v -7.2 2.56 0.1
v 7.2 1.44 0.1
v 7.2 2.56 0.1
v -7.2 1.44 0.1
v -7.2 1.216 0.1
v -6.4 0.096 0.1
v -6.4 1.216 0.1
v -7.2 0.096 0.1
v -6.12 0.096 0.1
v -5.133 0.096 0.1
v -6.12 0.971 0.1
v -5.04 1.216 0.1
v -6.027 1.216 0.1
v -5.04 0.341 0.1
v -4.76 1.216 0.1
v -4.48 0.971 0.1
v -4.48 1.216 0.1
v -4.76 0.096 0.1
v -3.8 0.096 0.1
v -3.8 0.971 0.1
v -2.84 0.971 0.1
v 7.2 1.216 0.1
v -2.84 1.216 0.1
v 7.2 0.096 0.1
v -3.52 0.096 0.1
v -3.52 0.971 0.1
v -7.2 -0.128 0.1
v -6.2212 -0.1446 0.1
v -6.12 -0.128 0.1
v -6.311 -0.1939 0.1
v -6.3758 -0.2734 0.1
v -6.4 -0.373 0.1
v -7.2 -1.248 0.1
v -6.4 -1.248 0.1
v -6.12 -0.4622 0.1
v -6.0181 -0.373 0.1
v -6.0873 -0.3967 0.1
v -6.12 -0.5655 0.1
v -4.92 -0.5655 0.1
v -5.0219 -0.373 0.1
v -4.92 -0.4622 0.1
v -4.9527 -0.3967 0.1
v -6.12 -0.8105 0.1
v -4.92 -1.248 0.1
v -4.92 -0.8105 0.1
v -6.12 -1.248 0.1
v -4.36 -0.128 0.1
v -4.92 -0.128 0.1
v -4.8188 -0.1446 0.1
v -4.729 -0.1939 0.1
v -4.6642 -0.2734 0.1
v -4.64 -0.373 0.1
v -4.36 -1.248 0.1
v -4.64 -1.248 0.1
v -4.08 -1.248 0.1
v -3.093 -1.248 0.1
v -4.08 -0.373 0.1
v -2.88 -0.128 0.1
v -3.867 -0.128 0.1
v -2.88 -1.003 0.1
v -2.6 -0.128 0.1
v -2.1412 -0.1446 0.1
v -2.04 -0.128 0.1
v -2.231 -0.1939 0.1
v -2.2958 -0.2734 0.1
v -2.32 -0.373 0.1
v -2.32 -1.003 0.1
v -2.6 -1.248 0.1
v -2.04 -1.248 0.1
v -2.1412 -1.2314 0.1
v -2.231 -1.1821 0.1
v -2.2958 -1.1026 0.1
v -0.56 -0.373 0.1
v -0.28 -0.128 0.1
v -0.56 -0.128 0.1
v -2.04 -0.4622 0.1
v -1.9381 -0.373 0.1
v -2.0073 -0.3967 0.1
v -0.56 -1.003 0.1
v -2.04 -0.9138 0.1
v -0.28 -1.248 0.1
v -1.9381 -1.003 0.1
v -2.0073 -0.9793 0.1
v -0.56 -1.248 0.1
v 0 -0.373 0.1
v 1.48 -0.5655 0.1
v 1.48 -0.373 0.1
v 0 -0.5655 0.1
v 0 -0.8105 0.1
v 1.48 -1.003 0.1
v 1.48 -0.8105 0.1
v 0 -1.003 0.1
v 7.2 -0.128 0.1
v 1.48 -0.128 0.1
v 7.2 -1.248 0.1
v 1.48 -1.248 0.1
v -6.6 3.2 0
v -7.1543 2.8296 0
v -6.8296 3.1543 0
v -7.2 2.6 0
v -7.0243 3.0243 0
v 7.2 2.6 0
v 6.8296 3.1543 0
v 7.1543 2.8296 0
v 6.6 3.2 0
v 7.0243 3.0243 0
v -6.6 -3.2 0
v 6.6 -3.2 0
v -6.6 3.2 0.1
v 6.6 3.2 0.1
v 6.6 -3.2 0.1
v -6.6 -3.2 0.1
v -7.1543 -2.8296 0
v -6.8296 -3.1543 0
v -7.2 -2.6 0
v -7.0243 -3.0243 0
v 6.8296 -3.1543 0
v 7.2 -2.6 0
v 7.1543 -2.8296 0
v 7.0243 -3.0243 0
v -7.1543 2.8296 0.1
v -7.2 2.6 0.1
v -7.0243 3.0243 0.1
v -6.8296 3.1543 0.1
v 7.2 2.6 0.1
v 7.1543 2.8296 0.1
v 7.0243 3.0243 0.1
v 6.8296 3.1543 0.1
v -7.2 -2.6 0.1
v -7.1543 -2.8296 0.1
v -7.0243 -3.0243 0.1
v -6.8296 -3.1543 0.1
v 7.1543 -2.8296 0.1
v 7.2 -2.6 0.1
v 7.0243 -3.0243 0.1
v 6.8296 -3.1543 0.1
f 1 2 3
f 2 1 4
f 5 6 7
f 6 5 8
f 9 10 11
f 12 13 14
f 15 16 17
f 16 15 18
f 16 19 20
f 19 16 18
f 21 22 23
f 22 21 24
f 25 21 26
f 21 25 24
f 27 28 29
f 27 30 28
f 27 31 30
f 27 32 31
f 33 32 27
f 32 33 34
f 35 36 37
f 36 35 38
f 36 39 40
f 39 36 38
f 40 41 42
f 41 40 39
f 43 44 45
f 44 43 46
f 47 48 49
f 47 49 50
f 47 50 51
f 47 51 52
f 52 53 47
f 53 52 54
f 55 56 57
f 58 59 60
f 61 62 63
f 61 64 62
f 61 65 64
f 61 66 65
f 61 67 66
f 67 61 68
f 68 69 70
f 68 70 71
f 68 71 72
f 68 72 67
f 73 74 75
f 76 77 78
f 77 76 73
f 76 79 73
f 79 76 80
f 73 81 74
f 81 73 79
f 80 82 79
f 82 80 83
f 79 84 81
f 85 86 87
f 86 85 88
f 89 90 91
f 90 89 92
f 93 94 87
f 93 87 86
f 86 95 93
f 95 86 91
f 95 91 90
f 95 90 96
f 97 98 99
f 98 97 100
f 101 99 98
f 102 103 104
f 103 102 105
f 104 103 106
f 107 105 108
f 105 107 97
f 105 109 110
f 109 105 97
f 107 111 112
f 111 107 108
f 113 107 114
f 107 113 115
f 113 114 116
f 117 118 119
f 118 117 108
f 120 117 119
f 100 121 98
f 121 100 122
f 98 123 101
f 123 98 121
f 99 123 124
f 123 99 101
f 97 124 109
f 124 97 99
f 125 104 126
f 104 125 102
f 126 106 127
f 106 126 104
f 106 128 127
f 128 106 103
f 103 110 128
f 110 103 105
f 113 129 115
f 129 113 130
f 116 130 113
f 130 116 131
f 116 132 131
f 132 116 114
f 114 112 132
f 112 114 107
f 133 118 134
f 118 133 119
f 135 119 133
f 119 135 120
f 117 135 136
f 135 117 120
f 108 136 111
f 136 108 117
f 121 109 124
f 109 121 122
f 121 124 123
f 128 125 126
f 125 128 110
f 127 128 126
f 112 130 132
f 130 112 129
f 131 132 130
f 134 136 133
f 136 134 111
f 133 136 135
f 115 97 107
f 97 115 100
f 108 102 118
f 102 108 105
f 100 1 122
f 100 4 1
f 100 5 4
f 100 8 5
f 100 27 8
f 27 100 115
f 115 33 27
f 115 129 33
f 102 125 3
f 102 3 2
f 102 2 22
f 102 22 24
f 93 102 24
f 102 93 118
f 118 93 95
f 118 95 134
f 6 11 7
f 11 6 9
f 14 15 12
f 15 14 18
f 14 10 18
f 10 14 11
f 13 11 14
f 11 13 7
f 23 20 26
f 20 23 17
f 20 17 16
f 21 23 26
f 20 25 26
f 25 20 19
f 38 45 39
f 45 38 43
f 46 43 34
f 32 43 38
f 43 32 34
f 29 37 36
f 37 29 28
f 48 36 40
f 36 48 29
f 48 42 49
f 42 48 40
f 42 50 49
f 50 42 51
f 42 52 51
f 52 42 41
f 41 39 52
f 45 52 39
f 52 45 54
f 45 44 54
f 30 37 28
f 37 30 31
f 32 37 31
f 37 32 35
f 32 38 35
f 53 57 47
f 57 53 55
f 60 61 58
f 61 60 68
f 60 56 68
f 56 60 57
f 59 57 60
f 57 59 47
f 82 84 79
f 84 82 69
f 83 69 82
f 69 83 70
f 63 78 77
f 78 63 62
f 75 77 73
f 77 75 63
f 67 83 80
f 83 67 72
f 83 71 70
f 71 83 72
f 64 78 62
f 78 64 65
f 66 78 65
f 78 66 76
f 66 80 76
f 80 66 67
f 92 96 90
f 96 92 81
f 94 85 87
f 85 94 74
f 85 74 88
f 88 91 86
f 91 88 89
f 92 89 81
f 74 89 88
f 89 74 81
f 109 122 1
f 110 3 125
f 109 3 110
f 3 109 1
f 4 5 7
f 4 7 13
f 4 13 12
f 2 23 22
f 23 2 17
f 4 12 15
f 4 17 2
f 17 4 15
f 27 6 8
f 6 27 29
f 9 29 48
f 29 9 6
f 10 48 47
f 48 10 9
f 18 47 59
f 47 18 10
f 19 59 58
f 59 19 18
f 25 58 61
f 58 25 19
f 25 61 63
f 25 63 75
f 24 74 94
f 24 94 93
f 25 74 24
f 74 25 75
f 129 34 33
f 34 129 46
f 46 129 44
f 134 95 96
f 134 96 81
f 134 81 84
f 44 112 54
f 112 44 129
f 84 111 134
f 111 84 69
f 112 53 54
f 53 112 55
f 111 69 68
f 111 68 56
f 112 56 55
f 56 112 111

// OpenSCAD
// file: s/6148328bds02.scad
use <../../lib.scad>
function ldraw_lib__s__6148328bds02() = [
// 0 ~Sticker  0.8 x  1.8 with Black "NT ANCE" on Black Halftone Stripes on White Background - Third Stripe Background
// 0 Name: s\6148328bds02.dat
// 0 Author: Massimo Maso [Sirio]
// 0 !LDRAW_ORG Subpart UPDATE 2024-08
// 0 !LICENSE Licensed under CC BY 4.0 : see CAreadme.txt
// 
// 0 BFC CERTIFY CCW
  [0,"BFC","CERTIFY"],
  [0,"BFC","CCW"],
// 
// 0 !HISTORY 2024-09-30 [OrionP] Official Update 2024-08
// 
// 
// 0 // Top faces
// 3 16 -18 0 -.32 -15.5529 0 -.3614 -15.3 0 -.32
  [3,16,-18,0,-.32,-15.5529,0,-.3614,-15.3,0,-.32],
// 3 16 -18 0 -.32 -15.7776 0 -.4847 -15.5529 0 -.3614
  [3,16,-18,0,-.32,-15.7776,0,-.4847,-15.5529,0,-.3614],
// 3 16 -18 0 -.32 -15.9395 0 -.6834 -15.7776 0 -.4847
  [3,16,-18,0,-.32,-15.9395,0,-.6834,-15.7776,0,-.4847],
// 3 16 -18 0 -.32 -16 0 -.9325 -15.9395 0 -.6834
  [3,16,-18,0,-.32,-16,0,-.9325,-15.9395,0,-.6834],
// 4 16 -18 0 -.32 -18 0 -3.12 -16 0 -3.12 -16 0 -.9325
  [4,16,-18,0,-.32,-18,0,-3.12,-16,0,-3.12,-16,0,-.9325],
// 4 16 -15.3 0 -1.4138 -15.0452 0 -.9325 -15.2182 0 -.9918 -15.3 0 -1.1555
  [4,16,-15.3,0,-1.4138,-15.0452,0,-.9325,-15.2182,0,-.9918,-15.3,0,-1.1555],
// 4 16 -15.3 0 -1.4138 -12.3 0 -1.4138 -12.5548 0 -.9325 -15.0452 0 -.9325
  [4,16,-15.3,0,-1.4138,-12.3,0,-1.4138,-12.5548,0,-.9325,-15.0452,0,-.9325],
// 4 16 -12.3 0 -1.4138 -12.3 0 -1.1555 -12.3817 0 -.9918 -12.5548 0 -.9325
  [4,16,-12.3,0,-1.4138,-12.3,0,-1.1555,-12.3817,0,-.9918,-12.5548,0,-.9325],
// 4 16 -15.3 0 -2.0263 -15.3 0 -3.12 -12.3 0 -3.12 -12.3 0 -2.0263
  [4,16,-15.3,0,-2.0263,-15.3,0,-3.12,-12.3,0,-3.12,-12.3,0,-2.0263],
// 3 16 -10.9 0 -.32 -12.3 0 -.32 -12.0471 0 -.3614
  [3,16,-10.9,0,-.32,-12.3,0,-.32,-12.0471,0,-.3614],
// 3 16 -10.9 0 -.32 -12.0471 0 -.3614 -11.8224 0 -.4847
  [3,16,-10.9,0,-.32,-12.0471,0,-.3614,-11.8224,0,-.4847],
// 3 16 -10.9 0 -.32 -11.8224 0 -.4847 -11.6605 0 -.6834
  [3,16,-10.9,0,-.32,-11.8224,0,-.4847,-11.6605,0,-.6834],
// 3 16 -10.9 0 -.32 -11.6605 0 -.6834 -11.6 0 -.9325
  [3,16,-10.9,0,-.32,-11.6605,0,-.6834,-11.6,0,-.9325],
// 4 16 -10.9 0 -.32 -11.6 0 -.9325 -11.6 0 -3.12 -10.9 0 -3.12
  [4,16,-10.9,0,-.32,-11.6,0,-.9325,-11.6,0,-3.12,-10.9,0,-3.12],
// 3 16 -10.2 0 -3.12 -7.7324 0 -3.12 -10.2 0 -.9325
  [3,16,-10.2,0,-3.12,-7.7324,0,-3.12,-10.2,0,-.9325],
// 3 16 -7.2 0 -.32 -9.6676 0 -.32 -7.2 0 -2.5075
  [3,16,-7.2,0,-.32,-9.6676,0,-.32,-7.2,0,-2.5075],
// 3 16 -6.5 0 -.32 -5.3529 0 -.3614 -5.1 0 -.32
  [3,16,-6.5,0,-.32,-5.3529,0,-.3614,-5.1,0,-.32],
// 3 16 -6.5 0 -.32 -5.5776 0 -.4847 -5.3529 0 -.3614
  [3,16,-6.5,0,-.32,-5.5776,0,-.4847,-5.3529,0,-.3614],
// 3 16 -6.5 0 -.32 -5.7395 0 -.6834 -5.5776 0 -.4847
  [3,16,-6.5,0,-.32,-5.7395,0,-.6834,-5.5776,0,-.4847],
// 3 16 -6.5 0 -.32 -5.8 0 -.9325 -5.7395 0 -.6834
  [3,16,-6.5,0,-.32,-5.8,0,-.9325,-5.7395,0,-.6834],
// 4 16 -6.5 0 -.32 -6.5 0 -3.12 -5.8 0 -2.5075 -5.8 0 -.9325
  [4,16,-6.5,0,-.32,-6.5,0,-3.12,-5.8,0,-2.5075,-5.8,0,-.9325],
// 3 16 -6.5 0 -3.12 -5.1 0 -3.12 -5.3529 0 -3.0786
  [3,16,-6.5,0,-3.12,-5.1,0,-3.12,-5.3529,0,-3.0786],
// 3 16 -6.5 0 -3.12 -5.3529 0 -3.0786 -5.5776 0 -2.9553
  [3,16,-6.5,0,-3.12,-5.3529,0,-3.0786,-5.5776,0,-2.9553],
// 3 16 -6.5 0 -3.12 -5.5776 0 -2.9553 -5.7395 0 -2.7566
  [3,16,-6.5,0,-3.12,-5.5776,0,-2.9553,-5.7395,0,-2.7566],
// 3 16 -6.5 0 -3.12 -5.7395 0 -2.7566 -5.8 0 -2.5075
  [3,16,-6.5,0,-3.12,-5.7395,0,-2.7566,-5.8,0,-2.5075],
// 3 16 -1.4 0 -.9325 -.7 0 -.32 -1.4 0 -.32
  [3,16,-1.4,0,-.9325,-.7,0,-.32,-1.4,0,-.32],
// 4 16 -1.4 0 -.9325 -4.8452 0 -.9325 -5.0182 0 -.9918 -5.1 0 -1.1555
  [4,16,-1.4,0,-.9325,-4.8452,0,-.9325,-5.0182,0,-.9918,-5.1,0,-1.1555],
// 4 16 -1.4 0 -.9325 -5.1 0 -1.1555 -5.1 0 -2.2846 -1.4 0 -2.5075
  [4,16,-1.4,0,-.9325,-5.1,0,-1.1555,-5.1,0,-2.2846,-1.4,0,-2.5075],
// 4 16 -1.4 0 -.9325 -1.4 0 -2.5075 -.7 0 -3.12 -.7 0 -.32
  [4,16,-1.4,0,-.9325,-1.4,0,-2.5075,-.7,0,-3.12,-.7,0,-.32],
// 4 16 -1.4 0 -2.5075 -5.1 0 -2.2846 -5.0182 0 -2.4482 -4.8452 0 -2.5075
  [4,16,-1.4,0,-2.5075,-5.1,0,-2.2846,-5.0182,0,-2.4482,-4.8452,0,-2.5075],
// 3 16 -1.4 0 -2.5075 -1.4 0 -3.12 -.7 0 -3.12
  [3,16,-1.4,0,-2.5075,-1.4,0,-3.12,-.7,0,-3.12],
// 4 16 0 0 -.9325 0 0 -1.4138 3.7 0 -1.4138 3.7 0 -.9325
  [4,16,0,0,-.9325,0,0,-1.4138,3.7,0,-1.4138,3.7,0,-.9325],
// 4 16 0 0 -2.0263 0 0 -2.5075 3.7 0 -2.5075 3.7 0 -2.0263
  [4,16,0,0,-2.0263,0,0,-2.5075,3.7,0,-2.5075,3.7,0,-2.0263],
// 3 16 18 0 -.32 3.7 0 -.32 3.7 0 -.9325
  [3,16,18,0,-.32,3.7,0,-.32,3.7,0,-.9325],
// 3 16 18 0 -.32 3.7 0 -.9325 3.7 0 -1.4138
  [3,16,18,0,-.32,3.7,0,-.9325,3.7,0,-1.4138],
// 4 16 18 0 -.32 3.7 0 -1.4138 3.7 0 -2.0263 18 0 -3.12
  [4,16,18,0,-.32,3.7,0,-1.4138,3.7,0,-2.0263,18,0,-3.12],
// 3 16 18 0 -3.12 3.7 0 -2.0263 3.7 0 -2.5075
  [3,16,18,0,-3.12,3.7,0,-2.0263,3.7,0,-2.5075],
// 3 16 18 0 -3.12 3.7 0 -2.5075 3.7 0 -3.12
  [3,16,18,0,-3.12,3.7,0,-2.5075,3.7,0,-3.12],
];
module ldraw_lib__s__6148328bds02(step=0, col=false, unit=2/5, alt=false, line=0.2, solid=!$preview)
    makepoly(ldraw_lib__s__6148328bds02(), step=step, col=col, unit=unit, alt=alt, line=line, solid=solid);
ldraw_lib__s__6148328bds02(line=0.2);
// file: s/6148328bds01.scad
use <../../lib.scad>
function ldraw_lib__s__6148328bds01() = [
// 0 ~Sticker  0.8 x  1.8 with Black "NT ANCE" on Black Halftone Stripes on White Background - Second Stripe Background
// 0 Name: s\6148328bds01.dat
// 0 Author: Massimo Maso [Sirio]
// 0 !LDRAW_ORG Subpart UPDATE 2024-08
// 0 !LICENSE Licensed under CC BY 4.0 : see CAreadme.txt
// 
// 0 BFC CERTIFY CCW
  [0,"BFC","CERTIFY"],
  [0,"BFC","CCW"],
// 
// 0 !HISTORY 2024-09-30 [OrionP] Official Update 2024-08
// 
// 
// 0 // Top faces
// 4 16 -18 0 3.04 -18 0 .24 -16 0 .24 -16 0 3.04
  [4,16,-18,0,3.04,-18,0,.24,-16,0,.24,-16,0,3.04],
// 3 16 -15.3 0 .24 -12.8324 0 .24 -15.3 0 2.4275
  [3,16,-15.3,0,.24,-12.8324,0,.24,-15.3,0,2.4275],
// 3 16 -12.6 0 3.04 -15.0676 0 3.04 -12.6 0 .8525
  [3,16,-12.6,0,3.04,-15.0676,0,3.04,-12.6,0,.8525],
// 4 16 -11.2 0 2.4275 -11.2 0 3.04 -11.9 0 3.04 -11.9 0 .24
  [4,16,-11.2,0,2.4275,-11.2,0,3.04,-11.9,0,3.04,-11.9,0,.24],
// 4 16 -11.2 0 2.4275 -11.9 0 .24 -9.5 0 .24 -9.5 0 2.4275
  [4,16,-11.2,0,2.4275,-11.9,0,.24,-9.5,0,.24,-9.5,0,2.4275],
// 4 16 -7.1 0 2.4275 18 0 .24 18 0 3.04 -7.1 0 3.04
  [4,16,-7.1,0,2.4275,18,0,.24,18,0,3.04,-7.1,0,3.04],
// 4 16 -7.1 0 2.4275 -8.8 0 2.4275 -8.8 0 .24 18 0 .24
  [4,16,-7.1,0,2.4275,-8.8,0,2.4275,-8.8,0,.24,18,0,.24],
];
module ldraw_lib__s__6148328bds01(step=0, col=false, unit=2/5, alt=false, line=0.2, solid=!$preview)
    makepoly(ldraw_lib__s__6148328bds01(), step=step, col=col, unit=unit, alt=alt, line=line, solid=solid);
ldraw_lib__s__6148328bds01(line=0.2);
// file: ../p/box3u12.scad
use <../lib.scad>
function ldraw_lib__box3u12() = [
// 0 Box with 3 Parallel Faces without Any Edges
// 0 Name: box3u12.dat
// 0 Author: J.C. Tchang [tchang]
// 0 !LDRAW_ORG Primitive UPDATE 2014-02
// 0 !LICENSE Licensed under CC BY 4.0 : see CAreadme.txt
// 
// 0 BFC CERTIFY CCW
  [0,"BFC","CERTIFY"],
  [0,"BFC","CCW"],
// 
// 0 !HISTORY 2014-12-23 [PTadmin] Official Update 2014-02
// 
// 
// 4 16 -1 1 1 1 1 1 1 1 -1 -1 1 -1
  [4,16,-1,1,1,1,1,1,1,1,-1,-1,1,-1],
// 4 16 -1 1 1 -1 0 1 1 0 1 1 1 1
  [4,16,-1,1,1,-1,0,1,1,0,1,1,1,1],
// 4 16 1 1 -1 1 0 -1 -1 0 -1 -1 1 -1
  [4,16,1,1,-1,1,0,-1,-1,0,-1,-1,1,-1],
];
module ldraw_lib__box3u12(step=0, col=false, unit=2/5, alt=false, line=0.2, solid=!$preview)
    makepoly(ldraw_lib__box3u12(), step=step, col=col, unit=unit, alt=alt, line=line, solid=solid);
ldraw_lib__box3u12(line=0.2);
// file: ../p/1-4cyli.scad
use <../lib.scad>
function ldraw_lib__1_4cyli() = [
// 0 Cylinder 0.25
// 0 Name: 1-4cyli.dat
// 0 Author: James Jessiman
// 0 !LDRAW_ORG Primitive UPDATE 2012-01
// 0 !LICENSE Licensed under CC BY 4.0 : see CAreadme.txt
// 
// 0 BFC CERTIFY CCW
  [0,"BFC","CERTIFY"],
  [0,"BFC","CCW"],
// 
// 0 !HISTORY 2002-03-23 [sbliss] Added BFC statement.
// 0 !HISTORY 2002-04-25 [PTadmin] Official Update 2002-02
// 0 !HISTORY 2007-06-22 [PTadmin] Header formatted for Contributor Agreement
// 0 !HISTORY 2008-07-01 [PTadmin] Official Update 2008-01
// 0 !HISTORY 2012-02-16 [Philo] Changed to CCW
// 0 !HISTORY 2012-03-30 [PTadmin] Official Update 2012-01
// 
// 
// 4 16 1 1 0 0.9239 1 0.3827 0.9239 0 0.3827 1 0 0
  [4,16,1,1,0,0.9239,1,0.3827,0.9239,0,0.3827,1,0,0],
// 5 24 1 0 0 1 1 0 0.9239 0 0.3827 1 0 -1
  [5,24,1,0,0,1,1,0,0.9239,0,0.3827,1,0,-1],
// 4 16 0.9239 1 0.3827 0.7071 1 0.7071 0.7071 0 0.7071 0.9239 0 0.3827
  [4,16,0.9239,1,0.3827,0.7071,1,0.7071,0.7071,0,0.7071,0.9239,0,0.3827],
// 5 24 0.9239 0 0.3827 0.9239 1 0.3827 0.7071 0 0.7071 1 0 0
  [5,24,0.9239,0,0.3827,0.9239,1,0.3827,0.7071,0,0.7071,1,0,0],
// 4 16 0.7071 1 0.7071 0.3827 1 0.9239 0.3827 0 0.9239 0.7071 0 0.7071
  [4,16,0.7071,1,0.7071,0.3827,1,0.9239,0.3827,0,0.9239,0.7071,0,0.7071],
// 5 24 0.7071 0 0.7071 0.7071 1 0.7071 0.3827 0 0.9239 0.9239 0 0.3827
  [5,24,0.7071,0,0.7071,0.7071,1,0.7071,0.3827,0,0.9239,0.9239,0,0.3827],
// 4 16 0.3827 1 0.9239 0 1 1 0 0 1 0.3827 0 0.9239
  [4,16,0.3827,1,0.9239,0,1,1,0,0,1,0.3827,0,0.9239],
// 5 24 0.3827 0 0.9239 0.3827 1 0.9239 0 0 1 0.7071 0 0.7071
  [5,24,0.3827,0,0.9239,0.3827,1,0.9239,0,0,1,0.7071,0,0.7071],
// 5 24 0 0 1 0 1 1 0.3827 0 0.9239 -1 0 1
  [5,24,0,0,1,0,1,1,0.3827,0,0.9239,-1,0,1],
];
module ldraw_lib__1_4cyli(step=0, col=false, unit=2/5, alt=false, line=0.2, solid=!$preview)
    makepoly(ldraw_lib__1_4cyli(), step=step, col=col, unit=unit, alt=alt, line=line, solid=solid);
ldraw_lib__1_4cyli(line=0.2);
// file: ../p/1-4chrd.scad
use <../lib.scad>
function ldraw_lib__1_4chrd() = [
// 0 Chord 0.25
// 0 Name: 1-4chrd.dat
// 0 Author: Max Martin Richter [MMR1988]
// 0 !LDRAW_ORG Primitive UPDATE 2023-05
// 0 !LICENSE Licensed under CC BY 4.0 : see CAreadme.txt
// 
// 0 BFC CERTIFY CCW
  [0,"BFC","CERTIFY"],
  [0,"BFC","CCW"],
// 
// 0 !HISTORY 2004-04-22 [PTadmin] Official Update 2004-02
// 0 !HISTORY 2007-10-09 [PTadmin] Header formatted for Contributor Agreement
// 0 !HISTORY 2008-07-01 [PTadmin] Official Update 2008-01
// 0 !HISTORY 2012-08-02 [MMR1988] Re-creation with PrimGen2 and Rectifier
// 0 !HISTORY 2012-08-09 [PTadmin] Official Update 2012-02
// 0 !HISTORY 2023-10-27 [OrionP] Change author to MMR1988 from hafhead
// 0 !HISTORY 2023-10-31 [OrionP] Official Update 2023-05
// 
// 4 16 0.9239 0 0.3827 0.3827 0 0.9239 0 0 1 1 0 0
  [4,16,0.9239,0,0.3827,0.3827,0,0.9239,0,0,1,1,0,0],
// 3 16 0.7071 0 0.7071 0.3827 0 0.9239 0.9239 0 0.3827
  [3,16,0.7071,0,0.7071,0.3827,0,0.9239,0.9239,0,0.3827],
];
module ldraw_lib__1_4chrd(step=0, col=false, unit=2/5, alt=false, line=0.2, solid=!$preview)
    makepoly(ldraw_lib__1_4chrd(), step=step, col=col, unit=unit, alt=alt, line=line, solid=solid);
ldraw_lib__1_4chrd(line=0.2);
// main file
use <../lib.scad>
use <../p/1-4chrd.scad>
use <../p/1-4cyli.scad>
use <../p/box3u12.scad>
use <s/6148328bds01.scad>
use <s/6148328bds02.scad>
function ldraw_lib__6148328bd() = [
// 0 Sticker  0.8 x  1.8 with Black "NT ANCE" on Black Halftone Stripes on White Background (Needs Work)
// 0 Name: 6148328bd.dat
// 0 Author: Massimo Maso [Sirio]
// 0 !LDRAW_ORG Part UPDATE 2024-08
// 0 !LICENSE Licensed under CC BY 4.0 : see CAreadme.txt
// 
// 0 !HELP Needs work: halftone areas in the headlamp are simplified with dark grey faces
// 
// 0 BFC CERTIFY CCW
  [0,"BFC","CERTIFY"],
  [0,"BFC","CCW"],
// 
// 0 !KEYWORDS 919, Hybrid, Pit Lane, Porsche, set 75876, Speed Champions
// 
// 0 !HISTORY 2024-09-30 [OrionP] Official Update 2024-08
// 
// 
// 0 // Textures
// 0 !TEXMAP START PLANAR -18 0 6.4 18 0 6.4 -18 0 3.6 6148328az.png
// 0 !: 4 15 -18 -.25 6.4 -18 -.25 3.6 18 -.25 3.6 18 -.25 6.4
// 0 !TEXMAP FALLBACK
// 4 72 -18 -.25 6.4 -18 -.25 3.6 18 -.25 3.6 18 -.25 6.4
  [4,72,-18,-.25,6.4,-18,-.25,3.6,18,-.25,3.6,18,-.25,6.4],
// 0 !TEXMAP END
// 0 !TEXMAP START PLANAR -18 0 3.04 18 0 3.04 -18 0 .24 6148328az.png
// 0 !: 1 15 0 -.25 0 1 0 0 0 1 0 0 0 1 s\6148328bds01.dat
// 0 !TEXMAP FALLBACK
// 1 72 0 -.25 0 1 0 0 0 1 0 0 0 1 s\6148328bds01.dat
  [1,72,0,-.25,0,1,0,0,0,1,0,0,0,1, ldraw_lib__s__6148328bds01()],
// 0 !TEXMAP END
// 0 !TEXMAP START PLANAR -18 0 -.32 18 0 -.32 -18 0 -3.12 6148328az.png
// 0 !: 1 15 0 -.25 0 1 0 0 0 1 0 0 0 1 s\6148328bds02.dat
// 0 !TEXMAP FALLBACK
// 1 72 0 -.25 0 1 0 0 0 1 0 0 0 1 s\6148328bds02.dat
  [1,72,0,-.25,0,1,0,0,0,1,0,0,0,1, ldraw_lib__s__6148328bds02()],
// 0 !TEXMAP END
// 0 // Primitives
// 1 16 -16.5 0 6.5 -1.5 0 0 0 -1 0 0 0 1.5 1-4chrd.dat
  [1,16,-16.5,0,6.5,-1.5,0,0,0,-1,0,0,0,1.5, ldraw_lib__1_4chrd()],
// 1 16 16.5 0 6.5 1.5 0 0 0 -1 0 0 0 1.5 1-4chrd.dat
  [1,16,16.5,0,6.5,1.5,0,0,0,-1,0,0,0,1.5, ldraw_lib__1_4chrd()],
// 1 16 0 -.25 0 16.5 0 0 0 .25 0 0 0 8 box3u12.dat
  [1,16,0,-.25,0,16.5,0,0,0,.25,0,0,0,8, ldraw_lib__box3u12()],
// 1 16 -16.5 0 -6.5 -1.5 0 0 0 -1 0 0 0 -1.5 1-4chrd.dat
  [1,16,-16.5,0,-6.5,-1.5,0,0,0,-1,0,0,0,-1.5, ldraw_lib__1_4chrd()],
// 1 16 16.5 0 -6.5 1.5 0 0 0 -1 0 0 0 -1.5 1-4chrd.dat
  [1,16,16.5,0,-6.5,1.5,0,0,0,-1,0,0,0,-1.5, ldraw_lib__1_4chrd()],
// 1 16 -16.5 0 6.5 -1.5 0 0 0 -.25 0 0 0 1.5 1-4cyli.dat
  [1,16,-16.5,0,6.5,-1.5,0,0,0,-.25,0,0,0,1.5, ldraw_lib__1_4cyli()],
// 1 16 16.5 0 6.5 1.5 0 0 0 -.25 0 0 0 1.5 1-4cyli.dat
  [1,16,16.5,0,6.5,1.5,0,0,0,-.25,0,0,0,1.5, ldraw_lib__1_4cyli()],
// 1 16 -16.5 0 -6.5 -1.5 0 0 0 -.25 0 0 0 -1.5 1-4cyli.dat
  [1,16,-16.5,0,-6.5,-1.5,0,0,0,-.25,0,0,0,-1.5, ldraw_lib__1_4cyli()],
// 1 16 16.5 0 -6.5 1.5 0 0 0 -.25 0 0 0 -1.5 1-4cyli.dat
  [1,16,16.5,0,-6.5,1.5,0,0,0,-.25,0,0,0,-1.5, ldraw_lib__1_4cyli()],
// 1 15 -16.5 -.25 6.5 -1.5 0 0 0 1 0 0 0 1.5 1-4chrd.dat
  [1,15,-16.5,-.25,6.5,-1.5,0,0,0,1,0,0,0,1.5, ldraw_lib__1_4chrd()],
// 1 15 16.5 -.25 6.5 1.5 0 0 0 1 0 0 0 1.5 1-4chrd.dat
  [1,15,16.5,-.25,6.5,1.5,0,0,0,1,0,0,0,1.5, ldraw_lib__1_4chrd()],
// 1 15 -16.5 -.25 -6.5 -1.5 0 0 0 1 0 0 0 -1.5 1-4chrd.dat
  [1,15,-16.5,-.25,-6.5,-1.5,0,0,0,1,0,0,0,-1.5, ldraw_lib__1_4chrd()],
// 1 15 16.5 -.25 -6.5 1.5 0 0 0 1 0 0 0 -1.5 1-4chrd.dat
  [1,15,16.5,-.25,-6.5,1.5,0,0,0,1,0,0,0,-1.5, ldraw_lib__1_4chrd()],
// 0 // Bottom faces
// 4 16 -16.5 0 8 -16.5 0 -8 -18 0 -6.5 -18 0 6.5
  [4,16,-16.5,0,8,-16.5,0,-8,-18,0,-6.5,-18,0,6.5],
// 4 16 16.5 0 8 18 0 6.5 18 0 -6.5 16.5 0 -8
  [4,16,16.5,0,8,18,0,6.5,18,0,-6.5,16.5,0,-8],
// 0 // Lateral faces
// 3 16 -18 0 6.5 -18 -.25 6.4 -18 -.25 6.5
  [3,16,-18,0,6.5,-18,-.25,6.4,-18,-.25,6.5],
// 3 16 -18 0 6.5 -18 -.25 3.6 -18 -.25 6.4
  [3,16,-18,0,6.5,-18,-.25,3.6,-18,-.25,6.4],
// 3 16 -18 0 6.5 -18 -.25 3.04 -18 -.25 3.6
  [3,16,-18,0,6.5,-18,-.25,3.04,-18,-.25,3.6],
// 3 16 -18 0 6.5 -18 -.25 .24 -18 -.25 3.04
  [3,16,-18,0,6.5,-18,-.25,.24,-18,-.25,3.04],
// 4 16 -18 0 6.5 -18 0 -6.5 -18 -.25 -.32 -18 -.25 .24
  [4,16,-18,0,6.5,-18,0,-6.5,-18,-.25,-.32,-18,-.25,.24],
// 3 16 -18 0 -6.5 -18 -.25 -3.12 -18 -.25 -.32
  [3,16,-18,0,-6.5,-18,-.25,-3.12,-18,-.25,-.32],
// 3 16 -18 0 -6.5 -18 -.25 -6.5 -18 -.25 -3.12
  [3,16,-18,0,-6.5,-18,-.25,-6.5,-18,-.25,-3.12],
// 3 16 18 0 6.5 18 -.25 6.5 18 -.25 6.4
  [3,16,18,0,6.5,18,-.25,6.5,18,-.25,6.4],
// 3 16 18 0 6.5 18 -.25 6.4 18 -.25 3.6
  [3,16,18,0,6.5,18,-.25,6.4,18,-.25,3.6],
// 3 16 18 0 6.5 18 -.25 3.6 18 -.25 3.04
  [3,16,18,0,6.5,18,-.25,3.6,18,-.25,3.04],
// 3 16 18 0 6.5 18 -.25 3.04 18 -.25 .24
  [3,16,18,0,6.5,18,-.25,3.04,18,-.25,.24],
// 4 16 18 0 6.5 18 -.25 .24 18 -.25 -.32 18 0 -6.5
  [4,16,18,0,6.5,18,-.25,.24,18,-.25,-.32,18,0,-6.5],
// 3 16 18 0 -6.5 18 -.25 -.32 18 -.25 -3.12
  [3,16,18,0,-6.5,18,-.25,-.32,18,-.25,-3.12],
// 3 16 18 0 -6.5 18 -.25 -3.12 18 -.25 -6.5
  [3,16,18,0,-6.5,18,-.25,-3.12,18,-.25,-6.5],
// 0 // Top faces
// 0 // Black text "NT"
// 0 // Letter "N"
// 4 0x2000000 -16 -.25 .24 -15.3 -.25 .24 -15.3 -.25 2.4275 -16 -.25 3.04
  [4,33554432,-16,-.25,.24,-15.3,-.25,.24,-15.3,-.25,2.4275,-16,-.25,3.04],
// 4 0x2000000 -11.9 -.25 3.04 -12.6 -.25 3.04 -12.6 -.25 .8525 -11.9 -.25 .24
  [4,33554432,-11.9,-.25,3.04,-12.6,-.25,3.04,-12.6,-.25,.8525,-11.9,-.25,.24],
// 4 0x2000000 -11.9 -.25 .24 -12.6 -.25 .8525 -15.3 -.25 2.4275 -12.8324 -.25 .24
  [4,33554432,-11.9,-.25,.24,-12.6,-.25,.8525,-15.3,-.25,2.4275,-12.8324,-.25,.24],
// 4 0x2000000 -16 -.25 3.04 -15.3 -.25 2.4275 -12.6 -.25 .8525 -15.0676 -.25 3.04
  [4,33554432,-16,-.25,3.04,-15.3,-.25,2.4275,-12.6,-.25,.8525,-15.0676,-.25,3.04],
// 
// 0 // Letter "T"
// 4 0x2000000 -8.8 -.25 2.4275 -7.1 -.25 3.04 -11.2 -.25 3.04 -9.5 -.25 2.4275
  [4,33554432,-8.8,-.25,2.4275,-7.1,-.25,3.04,-11.2,-.25,3.04,-9.5,-.25,2.4275],
// 3 0x2000000 -9.5 -.25 2.4275 -11.2 -.25 3.04 -11.2 -.25 2.4275
  [3,33554432,-9.5,-.25,2.4275,-11.2,-.25,3.04,-11.2,-.25,2.4275],
// 3 0x2000000 -7.1 -.25 2.4275 -7.1 -.25 3.04 -8.8 -.25 2.4275
  [3,33554432,-7.1,-.25,2.4275,-7.1,-.25,3.04,-8.8,-.25,2.4275],
// 4 0x2000000 -8.8 -.25 2.4275 -9.5 -.25 2.4275 -9.5 -.25 .24 -8.8 -.25 .24
  [4,33554432,-8.8,-.25,2.4275,-9.5,-.25,2.4275,-9.5,-.25,.24,-8.8,-.25,.24],
// 
// 0 // Black text "ANCE"
// 0 // Letter "A"
// 4 0x2000000 -15.3 -.25 -1.4138 -15.3 -.25 -2.0263 -12.3 -.25 -2.0263 -12.3 -.25 -1.4138
  [4,33554432,-15.3,-.25,-1.4138,-15.3,-.25,-2.0263,-12.3,-.25,-2.0263,-12.3,-.25,-1.4138],
// 3 0x2000000 -15.3 -.25 -3.12 -15.3 -.25 -2.0263 -16 -.25 -3.12
  [3,33554432,-15.3,-.25,-3.12,-15.3,-.25,-2.0263,-16,-.25,-3.12],
// 4 0x2000000 -15.3 -.25 -2.0263 -15.3 -.25 -1.4138 -16 -.25 -.9325 -16 -.25 -3.12
  [4,33554432,-15.3,-.25,-2.0263,-15.3,-.25,-1.4138,-16,-.25,-.9325,-16,-.25,-3.12],
// 4 0x2000000 -15.2182 -.25 -.9918 -15.0452 -.25 -.9325 -15.3 -.25 -.32 -15.5529 -.25 -.3614
  [4,33554432,-15.2182,-.25,-.9918,-15.0452,-.25,-.9325,-15.3,-.25,-.32,-15.5529,-.25,-.3614],
// 4 0x2000000 -15.3 -.25 -.32 -15.0452 -.25 -.9325 -12.5548 -.25 -.9325 -12.3 -.25 -.32
  [4,33554432,-15.3,-.25,-.32,-15.0452,-.25,-.9325,-12.5548,-.25,-.9325,-12.3,-.25,-.32],
// 4 0x2000000 -12.5548 -.25 -.9325 -12.3817 -.25 -.9918 -12.0471 -.25 -.3614 -12.3 -.25 -.32
  [4,33554432,-12.5548,-.25,-.9325,-12.3817,-.25,-.9918,-12.0471,-.25,-.3614,-12.3,-.25,-.32],
// 4 0x2000000 -12.3817 -.25 -.9918 -11.6605 -.25 -.6834 -11.8224 -.25 -.4847 -12.0471 -.25 -.3614
  [4,33554432,-12.3817,-.25,-.9918,-11.6605,-.25,-.6834,-11.8224,-.25,-.4847,-12.0471,-.25,-.3614],
// 4 0x2000000 -12.3817 -.25 -.9918 -12.3 -.25 -1.1555 -11.6 -.25 -.9325 -11.6605 -.25 -.6834
  [4,33554432,-12.3817,-.25,-.9918,-12.3,-.25,-1.1555,-11.6,-.25,-.9325,-11.6605,-.25,-.6834],
// 3 0x2000000 -12.3 -.25 -1.1555 -12.3 -.25 -1.4138 -11.6 -.25 -.9325
  [3,33554432,-12.3,-.25,-1.1555,-12.3,-.25,-1.4138,-11.6,-.25,-.9325],
// 4 0x2000000 -12.3 -.25 -1.4138 -12.3 -.25 -2.0263 -11.6 -.25 -3.12 -11.6 -.25 -.9325
  [4,33554432,-12.3,-.25,-1.4138,-12.3,-.25,-2.0263,-11.6,-.25,-3.12,-11.6,-.25,-.9325],
// 3 0x2000000 -12.3 -.25 -2.0263 -12.3 -.25 -3.12 -11.6 -.25 -3.12
  [3,33554432,-12.3,-.25,-2.0263,-12.3,-.25,-3.12,-11.6,-.25,-3.12],
// 4 0x2000000 -15.2182 -.25 -.9918 -15.5529 -.25 -.3614 -15.7776 -.25 -.4847 -15.9395 -.25 -.6834
  [4,33554432,-15.2182,-.25,-.9918,-15.5529,-.25,-.3614,-15.7776,-.25,-.4847,-15.9395,-.25,-.6834],
// 4 0x2000000 -15.9395 -.25 -.6834 -16 -.25 -.9325 -15.3 -.25 -1.1555 -15.2182 -.25 -.9918
  [4,33554432,-15.9395,-.25,-.6834,-16,-.25,-.9325,-15.3,-.25,-1.1555,-15.2182,-.25,-.9918],
// 3 0x2000000 -16 -.25 -.9325 -15.3 -.25 -1.4138 -15.3 -.25 -1.1555
  [3,33554432,-16,-.25,-.9325,-15.3,-.25,-1.4138,-15.3,-.25,-1.1555],
// 0 // Letter "N"
// 4 0x2000000 -10.2 -.25 -.9325 -10.9 -.25 -.32 -10.9 -.25 -3.12 -10.2 -.25 -3.12
  [4,33554432,-10.2,-.25,-.9325,-10.9,-.25,-.32,-10.9,-.25,-3.12,-10.2,-.25,-3.12],
// 4 0x2000000 -7.2 -.25 -2.5075 -6.5 -.25 -3.12 -6.5 -.25 -.32 -7.2 -.25 -.32
  [4,33554432,-7.2,-.25,-2.5075,-6.5,-.25,-3.12,-6.5,-.25,-.32,-7.2,-.25,-.32],
// 4 0x2000000 -10.2 -.25 -.9325 -7.7324 -.25 -3.12 -6.5 -.25 -3.12 -7.2 -.25 -2.5075
  [4,33554432,-10.2,-.25,-.9325,-7.7324,-.25,-3.12,-6.5,-.25,-3.12,-7.2,-.25,-2.5075],
// 4 0x2000000 -10.9 -.25 -.32 -10.2 -.25 -.9325 -7.2 -.25 -2.5075 -9.6676 -.25 -.32
  [4,33554432,-10.9,-.25,-.32,-10.2,-.25,-.9325,-7.2,-.25,-2.5075,-9.6676,-.25,-.32],
// 
// 0 // Letter "C"
// 4 0x2000000 -4.8452 -.25 -2.5075 -5.1 -.25 -3.12 -1.4 -.25 -3.12 -1.4 -.25 -2.5075
  [4,33554432,-4.8452,-.25,-2.5075,-5.1,-.25,-3.12,-1.4,-.25,-3.12,-1.4,-.25,-2.5075],
// 4 0x2000000 -5.0182 -.25 -2.4482 -5.3529 -.25 -3.0786 -5.1 -.25 -3.12 -4.8452 -.25 -2.5075
  [4,33554432,-5.0182,-.25,-2.4482,-5.3529,-.25,-3.0786,-5.1,-.25,-3.12,-4.8452,-.25,-2.5075],
// 4 0x2000000 -5.1 -.25 -.32 -5.3529 -.25 -.3614 -5.0182 -.25 -.9918 -4.8452 -.25 -.9325
  [4,33554432,-5.1,-.25,-.32,-5.3529,-.25,-.3614,-5.0182,-.25,-.9918,-4.8452,-.25,-.9325],
// 4 0x2000000 -5.1 -.25 -.32 -4.8452 -.25 -.9325 -1.4 -.25 -.9325 -1.4 -.25 -.32
  [4,33554432,-5.1,-.25,-.32,-4.8452,-.25,-.9325,-1.4,-.25,-.9325,-1.4,-.25,-.32],
// 4 0x2000000 -5.8 -.25 -2.5075 -5.7395 -.25 -2.7566 -5.0182 -.25 -2.4482 -5.1 -.25 -2.2846
  [4,33554432,-5.8,-.25,-2.5075,-5.7395,-.25,-2.7566,-5.0182,-.25,-2.4482,-5.1,-.25,-2.2846],
// 4 0x2000000 -5.3529 -.25 -3.0786 -5.0182 -.25 -2.4482 -5.7395 -.25 -2.7566 -5.5776 -.25 -2.9553
  [4,33554432,-5.3529,-.25,-3.0786,-5.0182,-.25,-2.4482,-5.7395,-.25,-2.7566,-5.5776,-.25,-2.9553],
// 4 0x2000000 -5.7395 -.25 -.6834 -5.0182 -.25 -.9918 -5.3529 -.25 -.3614 -5.5776 -.25 -.4847
  [4,33554432,-5.7395,-.25,-.6834,-5.0182,-.25,-.9918,-5.3529,-.25,-.3614,-5.5776,-.25,-.4847],
// 4 0x2000000 -5.8 -.25 -.9325 -5.1 -.25 -1.1555 -5.0182 -.25 -.9918 -5.7395 -.25 -.6834
  [4,33554432,-5.8,-.25,-.9325,-5.1,-.25,-1.1555,-5.0182,-.25,-.9918,-5.7395,-.25,-.6834],
// 4 0x2000000 -5.8 -.25 -2.5075 -5.1 -.25 -2.2846 -5.1 -.25 -1.1555 -5.8 -.25 -.9325
  [4,33554432,-5.8,-.25,-2.5075,-5.1,-.25,-2.2846,-5.1,-.25,-1.1555,-5.8,-.25,-.9325],
// 
// 0 // Letter "E"
// 4 0x2000000 0 -.25 -2.5075 -.7 -.25 -3.12 3.7 -.25 -3.12 3.7 -.25 -2.5075
  [4,33554432,0,-.25,-2.5075,-.7,-.25,-3.12,3.7,-.25,-3.12,3.7,-.25,-2.5075],
// 4 0x2000000 -.7 -.25 -.32 0 -.25 -.9325 3.7 -.25 -.9325 3.7 -.25 -.32
  [4,33554432,-.7,-.25,-.32,0,-.25,-.9325,3.7,-.25,-.9325,3.7,-.25,-.32],
// 3 0x2000000 0 -.25 -.9325 -.7 -.25 -.32 0 -.25 -1.4138
  [3,33554432,0,-.25,-.9325,-.7,-.25,-.32,0,-.25,-1.4138],
// 4 0x2000000 3.7 -.25 -2.0263 3.7 -.25 -1.4138 0 -.25 -1.4138 0 -.25 -2.0263
  [4,33554432,3.7,-.25,-2.0263,3.7,-.25,-1.4138,0,-.25,-1.4138,0,-.25,-2.0263],
// 3 0x2000000 0 -.25 -2.5075 0 -.25 -2.0263 -.7 -.25 -3.12
  [3,33554432,0,-.25,-2.5075,0,-.25,-2.0263,-.7,-.25,-3.12],
// 4 0x2000000 -.7 -.25 -.32 -.7 -.25 -3.12 0 -.25 -2.0263 0 -.25 -1.4138
  [4,33554432,-.7,-.25,-.32,-.7,-.25,-3.12,0,-.25,-2.0263,0,-.25,-1.4138],
// 
// 0 // White faces
// 
// 3 15 -16.5 -.25 8 -18 -.25 6.5 -18 -.25 6.4
  [3,15,-16.5,-.25,8,-18,-.25,6.5,-18,-.25,6.4],
// 3 15 16.5 -.25 8 18 -.25 6.4 18 -.25 6.5
  [3,15,16.5,-.25,8,18,-.25,6.4,18,-.25,6.5],
// 4 15 -16.5 -.25 8 -18 -.25 6.4 18 -.25 6.4 16.5 -.25 8
  [4,15,-16.5,-.25,8,-18,-.25,6.4,18,-.25,6.4,16.5,-.25,8],
// 3 15 -18 -.25 3.6 -18 -.25 3.04 -16 -.25 3.04
  [3,15,-18,-.25,3.6,-18,-.25,3.04,-16,-.25,3.04],
// 3 15 -18 -.25 3.6 -16 -.25 3.04 -15.0676 -.25 3.04
  [3,15,-18,-.25,3.6,-16,-.25,3.04,-15.0676,-.25,3.04],
// 3 15 -18 -.25 3.6 -15.0676 -.25 3.04 -12.6 -.25 3.04
  [3,15,-18,-.25,3.6,-15.0676,-.25,3.04,-12.6,-.25,3.04],
// 3 15 18 -.25 3.6 -7.1 -.25 3.04 18 -.25 3.04
  [3,15,18,-.25,3.6,-7.1,-.25,3.04,18,-.25,3.04],
// 3 15 -7.1 -.25 3.04 18 -.25 3.6 -11.2 -.25 3.04
  [3,15,-7.1,-.25,3.04,18,-.25,3.6,-11.2,-.25,3.04],
// 3 15 -18 -.25 3.6 -12.6 -.25 3.04 -11.9 -.25 3.04
  [3,15,-18,-.25,3.6,-12.6,-.25,3.04,-11.9,-.25,3.04],
// 4 15 -18 -.25 3.6 -11.9 -.25 3.04 -11.2 -.25 3.04 18 -.25 3.6
  [4,15,-18,-.25,3.6,-11.9,-.25,3.04,-11.2,-.25,3.04,18,-.25,3.6],
// 4 15 -18 -.25 .24 -18 -.25 -.32 -15.3 -.25 -.32 -16 -.25 .24
  [4,15,-18,-.25,.24,-18,-.25,-.32,-15.3,-.25,-.32,-16,-.25,.24],
// 4 15 -15.3 -.25 .24 -16 -.25 .24 -15.3 -.25 -.32 -12.3 -.25 -.32
  [4,15,-15.3,-.25,.24,-16,-.25,.24,-15.3,-.25,-.32,-12.3,-.25,-.32],
// 4 15 -15.3 -.25 .24 -12.3 -.25 -.32 -10.9 -.25 -.32 -12.8324 -.25 .24
  [4,15,-15.3,-.25,.24,-12.3,-.25,-.32,-10.9,-.25,-.32,-12.8324,-.25,.24],
// 4 15 -12.8324 -.25 .24 -10.9 -.25 -.32 -9.6676 -.25 -.32 -11.9 -.25 .24
  [4,15,-12.8324,-.25,.24,-10.9,-.25,-.32,-9.6676,-.25,-.32,-11.9,-.25,.24],
// 4 15 -9.5 -.25 .24 -11.9 -.25 .24 -9.6676 -.25 -.32 -7.2 -.25 -.32
  [4,15,-9.5,-.25,.24,-11.9,-.25,.24,-9.6676,-.25,-.32,-7.2,-.25,-.32],
// 4 15 -9.5 -.25 .24 -7.2 -.25 -.32 -6.5 -.25 -.32 -8.8 -.25 .24
  [4,15,-9.5,-.25,.24,-7.2,-.25,-.32,-6.5,-.25,-.32,-8.8,-.25,.24],
// 3 15 -8.8 -.25 .24 -6.5 -.25 -.32 -5.1 -.25 -.32
  [3,15,-8.8,-.25,.24,-6.5,-.25,-.32,-5.1,-.25,-.32],
// 3 15 -8.8 -.25 .24 -5.1 -.25 -.32 -1.4 -.25 -.32
  [3,15,-8.8,-.25,.24,-5.1,-.25,-.32,-1.4,-.25,-.32],
// 3 15 18 -.25 .24 -.7 -.25 -.32 3.7 -.25 -.32
  [3,15,18,-.25,.24,-.7,-.25,-.32,3.7,-.25,-.32],
// 3 15 18 -.25 .24 3.7 -.25 -.32 18 -.25 -.32
  [3,15,18,-.25,.24,3.7,-.25,-.32,18,-.25,-.32],
// 4 15 -8.8 -.25 .24 -1.4 -.25 -.32 -.7 -.25 -.32 18 -.25 .24
  [4,15,-8.8,-.25,.24,-1.4,-.25,-.32,-.7,-.25,-.32,18,-.25,.24],
// 3 15 -18 -.25 -6.5 -16 -.25 -3.12 -18 -.25 -3.12
  [3,15,-18,-.25,-6.5,-16,-.25,-3.12,-18,-.25,-3.12],
// 3 15 -16 -.25 -3.12 -18 -.25 -6.5 -15.3 -.25 -3.12
  [3,15,-16,-.25,-3.12,-18,-.25,-6.5,-15.3,-.25,-3.12],
// 3 15 -15.3 -.25 -3.12 -18 -.25 -6.5 -12.3 -.25 -3.12
  [3,15,-15.3,-.25,-3.12,-18,-.25,-6.5,-12.3,-.25,-3.12],
// 3 15 18 -.25 -6.5 18 -.25 -3.12 3.7 -.25 -3.12
  [3,15,18,-.25,-6.5,18,-.25,-3.12,3.7,-.25,-3.12],
// 3 15 18 -.25 -6.5 3.7 -.25 -3.12 -.7 -.25 -3.12
  [3,15,18,-.25,-6.5,3.7,-.25,-3.12,-.7,-.25,-3.12],
// 3 15 18 -.25 -6.5 -.7 -.25 -3.12 -1.4 -.25 -3.12
  [3,15,18,-.25,-6.5,-.7,-.25,-3.12,-1.4,-.25,-3.12],
// 4 15 -18 -.25 -6.5 -16.5 -.25 -8 -11.6 -.25 -3.12 -12.3 -.25 -3.12
  [4,15,-18,-.25,-6.5,-16.5,-.25,-8,-11.6,-.25,-3.12,-12.3,-.25,-3.12],
// 4 15 18 -.25 -6.5 -1.4 -.25 -3.12 -5.1 -.25 -3.12 16.5 -.25 -8
  [4,15,18,-.25,-6.5,-1.4,-.25,-3.12,-5.1,-.25,-3.12,16.5,-.25,-8],
// 3 15 -16.5 -.25 -8 -10.9 -.25 -3.12 -11.6 -.25 -3.12
  [3,15,-16.5,-.25,-8,-10.9,-.25,-3.12,-11.6,-.25,-3.12],
// 3 15 -10.9 -.25 -3.12 -16.5 -.25 -8 -10.2 -.25 -3.12
  [3,15,-10.9,-.25,-3.12,-16.5,-.25,-8,-10.2,-.25,-3.12],
// 3 15 16.5 -.25 -8 -5.1 -.25 -3.12 -6.5 -.25 -3.12
  [3,15,16.5,-.25,-8,-5.1,-.25,-3.12,-6.5,-.25,-3.12],
// 3 15 16.5 -.25 -8 -6.5 -.25 -3.12 -7.7324 -.25 -3.12
  [3,15,16.5,-.25,-8,-6.5,-.25,-3.12,-7.7324,-.25,-3.12],
// 4 15 -16.5 -.25 -8 16.5 -.25 -8 -7.7324 -.25 -3.12 -10.2 -.25 -3.12
  [4,15,-16.5,-.25,-8,16.5,-.25,-8,-7.7324,-.25,-3.12,-10.2,-.25,-3.12],
];
module ldraw_lib__6148328bd(step=0, col=false, unit=2/5, alt=false, line=0.2, solid=!$preview)
    makepoly(ldraw_lib__6148328bd(), step=step, col=col, unit=unit, alt=alt, line=line, solid=solid);
ldraw_lib__6148328bd(line=0.2);
